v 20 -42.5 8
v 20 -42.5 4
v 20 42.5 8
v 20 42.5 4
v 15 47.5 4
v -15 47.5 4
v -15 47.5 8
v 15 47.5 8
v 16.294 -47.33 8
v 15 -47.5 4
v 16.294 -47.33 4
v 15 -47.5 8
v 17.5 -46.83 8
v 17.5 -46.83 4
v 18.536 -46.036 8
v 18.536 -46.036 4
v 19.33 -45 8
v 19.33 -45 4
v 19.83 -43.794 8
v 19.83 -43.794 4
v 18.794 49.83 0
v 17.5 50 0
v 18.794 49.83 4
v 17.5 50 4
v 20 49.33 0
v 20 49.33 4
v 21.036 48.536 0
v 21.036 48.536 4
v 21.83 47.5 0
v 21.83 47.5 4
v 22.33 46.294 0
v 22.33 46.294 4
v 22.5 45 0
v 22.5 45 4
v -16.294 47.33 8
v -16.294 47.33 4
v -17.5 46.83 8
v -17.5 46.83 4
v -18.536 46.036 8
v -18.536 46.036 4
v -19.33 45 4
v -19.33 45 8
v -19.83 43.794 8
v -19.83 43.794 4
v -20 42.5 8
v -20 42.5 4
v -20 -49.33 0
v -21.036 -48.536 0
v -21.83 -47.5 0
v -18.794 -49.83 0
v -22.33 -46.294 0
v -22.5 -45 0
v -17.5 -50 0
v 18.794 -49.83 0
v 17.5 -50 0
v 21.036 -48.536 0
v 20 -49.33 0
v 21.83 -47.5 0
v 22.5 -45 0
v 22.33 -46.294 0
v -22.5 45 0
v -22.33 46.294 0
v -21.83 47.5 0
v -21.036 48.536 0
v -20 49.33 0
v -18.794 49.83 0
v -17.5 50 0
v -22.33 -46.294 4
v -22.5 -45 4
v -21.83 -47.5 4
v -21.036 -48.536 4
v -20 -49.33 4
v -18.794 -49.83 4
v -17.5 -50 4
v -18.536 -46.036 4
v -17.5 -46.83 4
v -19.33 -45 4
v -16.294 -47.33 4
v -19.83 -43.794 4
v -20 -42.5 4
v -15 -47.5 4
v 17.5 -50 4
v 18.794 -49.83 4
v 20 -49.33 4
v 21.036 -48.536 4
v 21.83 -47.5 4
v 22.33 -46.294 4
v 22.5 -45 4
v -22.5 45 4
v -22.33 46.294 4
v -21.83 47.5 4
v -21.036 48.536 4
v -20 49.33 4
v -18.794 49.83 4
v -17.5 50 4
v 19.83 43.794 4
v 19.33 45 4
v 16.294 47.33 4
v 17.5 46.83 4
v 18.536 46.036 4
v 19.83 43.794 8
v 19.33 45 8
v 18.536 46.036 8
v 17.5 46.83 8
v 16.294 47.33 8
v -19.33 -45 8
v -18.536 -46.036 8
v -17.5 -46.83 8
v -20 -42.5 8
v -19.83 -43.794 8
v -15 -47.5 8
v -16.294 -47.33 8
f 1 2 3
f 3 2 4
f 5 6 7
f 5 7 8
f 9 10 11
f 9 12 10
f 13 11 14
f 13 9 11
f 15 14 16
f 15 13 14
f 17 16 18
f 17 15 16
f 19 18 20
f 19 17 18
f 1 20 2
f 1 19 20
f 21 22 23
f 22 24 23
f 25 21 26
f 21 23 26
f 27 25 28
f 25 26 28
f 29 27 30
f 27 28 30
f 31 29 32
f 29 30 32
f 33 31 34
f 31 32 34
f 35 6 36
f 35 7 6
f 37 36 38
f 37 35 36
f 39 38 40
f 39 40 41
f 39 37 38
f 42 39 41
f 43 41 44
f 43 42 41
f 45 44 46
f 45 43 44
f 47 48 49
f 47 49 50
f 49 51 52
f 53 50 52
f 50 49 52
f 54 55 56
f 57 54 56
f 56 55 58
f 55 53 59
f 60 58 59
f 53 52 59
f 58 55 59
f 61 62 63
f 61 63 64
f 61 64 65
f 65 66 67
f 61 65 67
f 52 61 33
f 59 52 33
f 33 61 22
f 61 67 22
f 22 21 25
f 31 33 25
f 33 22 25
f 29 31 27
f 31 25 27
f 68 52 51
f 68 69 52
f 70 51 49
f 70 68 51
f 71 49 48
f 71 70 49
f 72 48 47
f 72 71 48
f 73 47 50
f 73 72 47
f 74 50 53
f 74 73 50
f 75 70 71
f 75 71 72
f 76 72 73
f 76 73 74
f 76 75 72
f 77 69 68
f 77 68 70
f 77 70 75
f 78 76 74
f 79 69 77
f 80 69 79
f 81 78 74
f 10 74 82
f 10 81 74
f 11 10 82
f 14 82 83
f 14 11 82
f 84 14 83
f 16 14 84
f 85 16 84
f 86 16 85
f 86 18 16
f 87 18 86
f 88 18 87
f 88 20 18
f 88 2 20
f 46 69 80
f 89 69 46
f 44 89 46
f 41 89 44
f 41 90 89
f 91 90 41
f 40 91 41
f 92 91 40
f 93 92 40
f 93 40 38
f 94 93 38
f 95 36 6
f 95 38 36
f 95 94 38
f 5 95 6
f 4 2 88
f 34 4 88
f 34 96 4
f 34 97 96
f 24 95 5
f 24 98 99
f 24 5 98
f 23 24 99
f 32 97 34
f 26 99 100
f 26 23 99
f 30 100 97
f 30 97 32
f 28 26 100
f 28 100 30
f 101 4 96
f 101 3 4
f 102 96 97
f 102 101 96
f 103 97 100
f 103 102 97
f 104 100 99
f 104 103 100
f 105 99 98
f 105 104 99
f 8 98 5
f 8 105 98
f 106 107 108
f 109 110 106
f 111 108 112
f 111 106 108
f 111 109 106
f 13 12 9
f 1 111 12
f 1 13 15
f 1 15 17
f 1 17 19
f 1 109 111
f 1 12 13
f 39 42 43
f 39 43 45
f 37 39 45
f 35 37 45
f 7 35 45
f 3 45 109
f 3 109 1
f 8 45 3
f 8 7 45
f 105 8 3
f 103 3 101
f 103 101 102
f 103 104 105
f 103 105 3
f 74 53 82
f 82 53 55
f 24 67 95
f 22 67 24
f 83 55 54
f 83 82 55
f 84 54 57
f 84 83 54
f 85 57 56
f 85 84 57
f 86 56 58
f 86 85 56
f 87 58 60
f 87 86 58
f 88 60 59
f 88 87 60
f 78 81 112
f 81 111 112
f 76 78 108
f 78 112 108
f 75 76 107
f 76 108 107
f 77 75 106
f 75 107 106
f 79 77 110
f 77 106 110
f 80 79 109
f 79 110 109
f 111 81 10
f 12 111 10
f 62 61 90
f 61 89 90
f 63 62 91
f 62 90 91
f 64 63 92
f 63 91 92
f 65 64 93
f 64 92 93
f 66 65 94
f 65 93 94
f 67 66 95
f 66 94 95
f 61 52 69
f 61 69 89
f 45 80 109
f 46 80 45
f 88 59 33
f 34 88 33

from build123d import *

# Parameters (mm, degrees)
SKETCH_1_W      = 45
SKETCH_1_H      = 100
EXTRUDE_1_DEPTH = 4
SKETCH_2_W      = 40
SKETCH_2_H      = 95
EXTRUDE_2_DEPTH = 4
FILLET_1_R      = 5


with BuildPart() as part:
    # 草圖1 → 填料-伸長1 (new body)
    with BuildSketch(Plane.XY):
        Rectangle(SKETCH_1_W, SKETCH_1_H)
    extrude(amount=EXTRUDE_1_DEPTH)

    # 草圖2 → 填料-伸長2 (add)
    with BuildSketch(Plane.XY.offset(4)):
        Rectangle(SKETCH_2_W, SKETCH_2_H)
    extrude(amount=EXTRUDE_2_DEPTH)

    # 圓角1
    fillet_1_edges = [part.edges().sort_by_distance(p)[0] for p in [
        (20, -47.5, 6),
        (20, 47.5, 6),
        (-20, 47.5, 6),
        (-20, -47.5, 6),
        (22.5, -50, 2),
        (-22.5, -50, 2),
        (-22.5, 50, 2),
        (22.5, 50, 2),
    ]]
    fillet(fillet_1_edges, radius=FILLET_1_R)


solid = part.part
